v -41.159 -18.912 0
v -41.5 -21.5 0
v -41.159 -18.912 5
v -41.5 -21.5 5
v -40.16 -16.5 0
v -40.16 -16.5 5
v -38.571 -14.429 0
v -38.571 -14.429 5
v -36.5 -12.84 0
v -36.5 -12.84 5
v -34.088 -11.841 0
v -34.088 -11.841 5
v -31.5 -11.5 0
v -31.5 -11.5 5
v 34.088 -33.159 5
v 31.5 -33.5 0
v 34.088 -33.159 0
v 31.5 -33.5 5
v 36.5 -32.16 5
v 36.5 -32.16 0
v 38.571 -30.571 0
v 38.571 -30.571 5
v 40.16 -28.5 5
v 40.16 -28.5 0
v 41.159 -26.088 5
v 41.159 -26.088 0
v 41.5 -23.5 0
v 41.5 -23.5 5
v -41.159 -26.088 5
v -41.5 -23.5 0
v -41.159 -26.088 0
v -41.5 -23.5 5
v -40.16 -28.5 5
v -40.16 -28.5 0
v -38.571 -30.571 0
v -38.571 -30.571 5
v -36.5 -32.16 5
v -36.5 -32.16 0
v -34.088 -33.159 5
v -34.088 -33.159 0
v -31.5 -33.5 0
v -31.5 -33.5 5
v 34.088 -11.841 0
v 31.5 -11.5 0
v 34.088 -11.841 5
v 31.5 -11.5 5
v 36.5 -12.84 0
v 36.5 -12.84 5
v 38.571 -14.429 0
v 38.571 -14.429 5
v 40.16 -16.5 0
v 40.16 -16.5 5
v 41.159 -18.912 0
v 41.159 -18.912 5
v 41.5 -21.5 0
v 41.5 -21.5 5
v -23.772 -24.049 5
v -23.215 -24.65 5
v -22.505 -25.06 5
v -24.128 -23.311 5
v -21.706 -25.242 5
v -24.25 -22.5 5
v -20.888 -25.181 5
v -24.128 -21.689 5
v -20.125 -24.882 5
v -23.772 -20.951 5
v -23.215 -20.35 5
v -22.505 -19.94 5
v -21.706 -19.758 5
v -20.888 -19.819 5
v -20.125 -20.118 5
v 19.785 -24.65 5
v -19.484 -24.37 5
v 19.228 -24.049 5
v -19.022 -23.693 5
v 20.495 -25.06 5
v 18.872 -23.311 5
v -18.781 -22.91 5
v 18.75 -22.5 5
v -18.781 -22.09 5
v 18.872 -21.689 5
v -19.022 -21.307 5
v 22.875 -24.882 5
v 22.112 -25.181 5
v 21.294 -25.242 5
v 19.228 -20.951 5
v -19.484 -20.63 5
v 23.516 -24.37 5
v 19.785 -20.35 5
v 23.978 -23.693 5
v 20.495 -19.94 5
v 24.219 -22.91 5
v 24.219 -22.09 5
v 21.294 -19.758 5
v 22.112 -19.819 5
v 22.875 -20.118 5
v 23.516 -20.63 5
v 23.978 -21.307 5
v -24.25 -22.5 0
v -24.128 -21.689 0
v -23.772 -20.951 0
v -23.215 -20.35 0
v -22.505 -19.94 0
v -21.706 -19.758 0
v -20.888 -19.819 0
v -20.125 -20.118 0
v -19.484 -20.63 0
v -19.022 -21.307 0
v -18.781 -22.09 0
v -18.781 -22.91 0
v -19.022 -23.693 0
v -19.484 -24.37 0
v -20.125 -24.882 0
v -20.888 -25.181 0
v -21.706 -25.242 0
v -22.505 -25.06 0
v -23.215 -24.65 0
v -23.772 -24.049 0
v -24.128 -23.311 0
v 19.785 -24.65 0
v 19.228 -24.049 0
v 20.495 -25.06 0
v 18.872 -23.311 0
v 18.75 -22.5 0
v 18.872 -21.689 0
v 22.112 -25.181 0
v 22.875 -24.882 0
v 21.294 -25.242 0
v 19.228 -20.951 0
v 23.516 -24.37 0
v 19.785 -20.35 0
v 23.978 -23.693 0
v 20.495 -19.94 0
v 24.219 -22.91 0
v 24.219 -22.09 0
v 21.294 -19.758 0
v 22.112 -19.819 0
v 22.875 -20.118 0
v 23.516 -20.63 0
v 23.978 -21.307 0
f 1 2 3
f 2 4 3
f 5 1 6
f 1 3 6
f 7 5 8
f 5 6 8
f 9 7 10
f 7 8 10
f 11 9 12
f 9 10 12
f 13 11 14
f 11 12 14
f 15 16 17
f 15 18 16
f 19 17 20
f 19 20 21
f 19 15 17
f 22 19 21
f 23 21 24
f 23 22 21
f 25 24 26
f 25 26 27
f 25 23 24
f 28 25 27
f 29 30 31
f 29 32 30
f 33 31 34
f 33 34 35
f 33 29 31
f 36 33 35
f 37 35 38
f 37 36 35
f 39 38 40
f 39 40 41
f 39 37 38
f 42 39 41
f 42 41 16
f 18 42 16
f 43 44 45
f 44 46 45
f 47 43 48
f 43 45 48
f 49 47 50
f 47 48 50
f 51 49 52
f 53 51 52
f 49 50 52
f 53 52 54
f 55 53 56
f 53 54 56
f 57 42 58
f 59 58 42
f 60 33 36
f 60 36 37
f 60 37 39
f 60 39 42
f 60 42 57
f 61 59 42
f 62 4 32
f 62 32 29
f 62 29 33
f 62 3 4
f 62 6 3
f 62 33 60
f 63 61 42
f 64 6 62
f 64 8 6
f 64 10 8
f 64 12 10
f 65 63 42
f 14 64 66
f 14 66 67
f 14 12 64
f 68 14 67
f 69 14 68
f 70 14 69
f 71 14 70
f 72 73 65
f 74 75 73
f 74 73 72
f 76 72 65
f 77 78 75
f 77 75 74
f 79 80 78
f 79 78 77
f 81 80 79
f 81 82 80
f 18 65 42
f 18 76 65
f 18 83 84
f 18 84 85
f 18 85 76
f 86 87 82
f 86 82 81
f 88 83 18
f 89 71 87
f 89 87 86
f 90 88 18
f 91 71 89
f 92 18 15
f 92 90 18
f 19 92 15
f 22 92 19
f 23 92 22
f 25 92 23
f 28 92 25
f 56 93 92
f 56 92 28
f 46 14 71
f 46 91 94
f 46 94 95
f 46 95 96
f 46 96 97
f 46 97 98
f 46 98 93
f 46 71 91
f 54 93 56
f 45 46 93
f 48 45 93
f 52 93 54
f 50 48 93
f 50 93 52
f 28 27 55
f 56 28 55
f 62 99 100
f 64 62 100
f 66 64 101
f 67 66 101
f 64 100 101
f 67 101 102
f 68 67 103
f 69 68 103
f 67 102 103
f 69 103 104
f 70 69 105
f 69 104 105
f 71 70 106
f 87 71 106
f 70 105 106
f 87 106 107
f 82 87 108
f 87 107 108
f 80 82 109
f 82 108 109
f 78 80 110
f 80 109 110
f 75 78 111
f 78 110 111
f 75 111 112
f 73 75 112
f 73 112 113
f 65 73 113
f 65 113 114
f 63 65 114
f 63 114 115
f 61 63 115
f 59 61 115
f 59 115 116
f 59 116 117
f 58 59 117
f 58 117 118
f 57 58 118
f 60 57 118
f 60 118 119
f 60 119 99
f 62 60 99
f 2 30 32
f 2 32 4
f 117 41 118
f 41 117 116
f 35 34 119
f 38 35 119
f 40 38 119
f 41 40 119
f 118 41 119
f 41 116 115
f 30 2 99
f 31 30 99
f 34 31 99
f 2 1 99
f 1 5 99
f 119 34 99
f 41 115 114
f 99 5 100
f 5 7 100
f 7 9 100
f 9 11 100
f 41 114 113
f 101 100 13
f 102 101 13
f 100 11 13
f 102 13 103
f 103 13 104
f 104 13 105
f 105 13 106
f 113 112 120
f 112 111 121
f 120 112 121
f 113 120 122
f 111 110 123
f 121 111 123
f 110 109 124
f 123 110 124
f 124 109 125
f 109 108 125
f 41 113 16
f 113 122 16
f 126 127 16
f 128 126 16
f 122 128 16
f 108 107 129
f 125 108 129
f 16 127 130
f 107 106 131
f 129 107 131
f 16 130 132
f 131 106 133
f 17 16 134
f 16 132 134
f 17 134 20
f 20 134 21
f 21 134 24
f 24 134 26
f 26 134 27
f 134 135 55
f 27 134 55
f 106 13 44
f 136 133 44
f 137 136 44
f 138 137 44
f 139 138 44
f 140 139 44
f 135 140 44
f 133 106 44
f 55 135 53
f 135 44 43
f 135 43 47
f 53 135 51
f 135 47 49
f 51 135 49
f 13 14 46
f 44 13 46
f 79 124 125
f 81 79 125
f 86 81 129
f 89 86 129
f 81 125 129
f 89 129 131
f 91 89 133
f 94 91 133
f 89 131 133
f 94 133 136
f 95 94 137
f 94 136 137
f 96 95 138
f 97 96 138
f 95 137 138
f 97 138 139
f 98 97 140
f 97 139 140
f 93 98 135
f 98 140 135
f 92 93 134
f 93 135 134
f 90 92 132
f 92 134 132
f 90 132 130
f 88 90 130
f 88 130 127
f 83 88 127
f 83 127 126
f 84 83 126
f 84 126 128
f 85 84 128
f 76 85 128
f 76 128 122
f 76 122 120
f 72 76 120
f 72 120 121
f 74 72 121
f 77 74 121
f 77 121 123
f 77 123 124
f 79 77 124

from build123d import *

# Parameters (mm, degrees)
SKETCH1_W            = 83
SKETCH1_H            = 67
BOSS_EXTRUDE1_DEPTH  = 5
M5_CLEARANCE_HOLE1_D = 5.5
M3_CLEARANCE_HOLE1_D = 3.4
SKETCH6_R            = 11.05
CUT_EXTRUDE1_DEPTH   = 6
FILLET1_R            = 10
SKETCH7_W            = 96.913580025
SKETCH7_H            = 48.46217056
CUT_EXTRUDE2_DEPTH   = 6
FILLET2_R            = 10


with BuildPart() as part:
    # Sketch1 → Boss-Extrude1 (new body)
    with BuildSketch(Plane.XY):
        Rectangle(SKETCH1_W, SKETCH1_H)
    extrude(amount=BOSS_EXTRUDE1_DEPTH)

    # M5 Clearance Hole1 (through all)
    with Locations(Plane.XY.offset(5)):
        with Locations((21.5, -22.5), (-21.5, -22.5)):
            Hole(M5_CLEARANCE_HOLE1_D / 2)

    # M3 Clearance Hole1 (through all)
    with Locations(Plane(origin=(0, 0, 0), x_dir=(-1, 0, 0), z_dir=(0, 0, -1))):
        with Locations((-32.041076253, 28.00000478), (-1.041076253, 28.00000478), (-1.041076253, -2.99999522), (-32.041076253, -2.99999522)):
            Hole(M3_CLEARANCE_HOLE1_D / 2)

    # Sketch6 → Cut-Extrude1 (cut, through all)
    with BuildSketch(Plane.XY.offset(5)):
        with Locations((16.541076624, 12.500005008)):
            Circle(SKETCH6_R)
    extrude(amount=-CUT_EXTRUDE1_DEPTH, mode=Mode.SUBTRACT)

    # Fillet1
    fillet1_edges = [part.edges().sort_by_distance(p)[0] for p in [
        (41.5, -33.5, 2.5),
        (-41.5, -33.5, 2.5),
        (-41.5, 33.5, 2.5),
        (41.5, 33.5, 2.5),
    ]]
    fillet(fillet1_edges, radius=FILLET1_R)

    # Sketch7 → Cut-Extrude2 (cut, through all)
    with BuildSketch(Plane.XY.offset(5)):
        with Locations((2.882260535, 12.73108528)):
            Rectangle(SKETCH7_W, SKETCH7_H)
    extrude(amount=-CUT_EXTRUDE2_DEPTH, mode=Mode.SUBTRACT)

    # Fillet2
    fillet2_edges = [part.edges().sort_by_distance(p)[0] for p in [
        (41.5, -11.5, 2.5),
        (-41.5, -11.5, 2.5),
    ]]
    fillet(fillet2_edges, radius=FILLET2_R)


solid = part.part
